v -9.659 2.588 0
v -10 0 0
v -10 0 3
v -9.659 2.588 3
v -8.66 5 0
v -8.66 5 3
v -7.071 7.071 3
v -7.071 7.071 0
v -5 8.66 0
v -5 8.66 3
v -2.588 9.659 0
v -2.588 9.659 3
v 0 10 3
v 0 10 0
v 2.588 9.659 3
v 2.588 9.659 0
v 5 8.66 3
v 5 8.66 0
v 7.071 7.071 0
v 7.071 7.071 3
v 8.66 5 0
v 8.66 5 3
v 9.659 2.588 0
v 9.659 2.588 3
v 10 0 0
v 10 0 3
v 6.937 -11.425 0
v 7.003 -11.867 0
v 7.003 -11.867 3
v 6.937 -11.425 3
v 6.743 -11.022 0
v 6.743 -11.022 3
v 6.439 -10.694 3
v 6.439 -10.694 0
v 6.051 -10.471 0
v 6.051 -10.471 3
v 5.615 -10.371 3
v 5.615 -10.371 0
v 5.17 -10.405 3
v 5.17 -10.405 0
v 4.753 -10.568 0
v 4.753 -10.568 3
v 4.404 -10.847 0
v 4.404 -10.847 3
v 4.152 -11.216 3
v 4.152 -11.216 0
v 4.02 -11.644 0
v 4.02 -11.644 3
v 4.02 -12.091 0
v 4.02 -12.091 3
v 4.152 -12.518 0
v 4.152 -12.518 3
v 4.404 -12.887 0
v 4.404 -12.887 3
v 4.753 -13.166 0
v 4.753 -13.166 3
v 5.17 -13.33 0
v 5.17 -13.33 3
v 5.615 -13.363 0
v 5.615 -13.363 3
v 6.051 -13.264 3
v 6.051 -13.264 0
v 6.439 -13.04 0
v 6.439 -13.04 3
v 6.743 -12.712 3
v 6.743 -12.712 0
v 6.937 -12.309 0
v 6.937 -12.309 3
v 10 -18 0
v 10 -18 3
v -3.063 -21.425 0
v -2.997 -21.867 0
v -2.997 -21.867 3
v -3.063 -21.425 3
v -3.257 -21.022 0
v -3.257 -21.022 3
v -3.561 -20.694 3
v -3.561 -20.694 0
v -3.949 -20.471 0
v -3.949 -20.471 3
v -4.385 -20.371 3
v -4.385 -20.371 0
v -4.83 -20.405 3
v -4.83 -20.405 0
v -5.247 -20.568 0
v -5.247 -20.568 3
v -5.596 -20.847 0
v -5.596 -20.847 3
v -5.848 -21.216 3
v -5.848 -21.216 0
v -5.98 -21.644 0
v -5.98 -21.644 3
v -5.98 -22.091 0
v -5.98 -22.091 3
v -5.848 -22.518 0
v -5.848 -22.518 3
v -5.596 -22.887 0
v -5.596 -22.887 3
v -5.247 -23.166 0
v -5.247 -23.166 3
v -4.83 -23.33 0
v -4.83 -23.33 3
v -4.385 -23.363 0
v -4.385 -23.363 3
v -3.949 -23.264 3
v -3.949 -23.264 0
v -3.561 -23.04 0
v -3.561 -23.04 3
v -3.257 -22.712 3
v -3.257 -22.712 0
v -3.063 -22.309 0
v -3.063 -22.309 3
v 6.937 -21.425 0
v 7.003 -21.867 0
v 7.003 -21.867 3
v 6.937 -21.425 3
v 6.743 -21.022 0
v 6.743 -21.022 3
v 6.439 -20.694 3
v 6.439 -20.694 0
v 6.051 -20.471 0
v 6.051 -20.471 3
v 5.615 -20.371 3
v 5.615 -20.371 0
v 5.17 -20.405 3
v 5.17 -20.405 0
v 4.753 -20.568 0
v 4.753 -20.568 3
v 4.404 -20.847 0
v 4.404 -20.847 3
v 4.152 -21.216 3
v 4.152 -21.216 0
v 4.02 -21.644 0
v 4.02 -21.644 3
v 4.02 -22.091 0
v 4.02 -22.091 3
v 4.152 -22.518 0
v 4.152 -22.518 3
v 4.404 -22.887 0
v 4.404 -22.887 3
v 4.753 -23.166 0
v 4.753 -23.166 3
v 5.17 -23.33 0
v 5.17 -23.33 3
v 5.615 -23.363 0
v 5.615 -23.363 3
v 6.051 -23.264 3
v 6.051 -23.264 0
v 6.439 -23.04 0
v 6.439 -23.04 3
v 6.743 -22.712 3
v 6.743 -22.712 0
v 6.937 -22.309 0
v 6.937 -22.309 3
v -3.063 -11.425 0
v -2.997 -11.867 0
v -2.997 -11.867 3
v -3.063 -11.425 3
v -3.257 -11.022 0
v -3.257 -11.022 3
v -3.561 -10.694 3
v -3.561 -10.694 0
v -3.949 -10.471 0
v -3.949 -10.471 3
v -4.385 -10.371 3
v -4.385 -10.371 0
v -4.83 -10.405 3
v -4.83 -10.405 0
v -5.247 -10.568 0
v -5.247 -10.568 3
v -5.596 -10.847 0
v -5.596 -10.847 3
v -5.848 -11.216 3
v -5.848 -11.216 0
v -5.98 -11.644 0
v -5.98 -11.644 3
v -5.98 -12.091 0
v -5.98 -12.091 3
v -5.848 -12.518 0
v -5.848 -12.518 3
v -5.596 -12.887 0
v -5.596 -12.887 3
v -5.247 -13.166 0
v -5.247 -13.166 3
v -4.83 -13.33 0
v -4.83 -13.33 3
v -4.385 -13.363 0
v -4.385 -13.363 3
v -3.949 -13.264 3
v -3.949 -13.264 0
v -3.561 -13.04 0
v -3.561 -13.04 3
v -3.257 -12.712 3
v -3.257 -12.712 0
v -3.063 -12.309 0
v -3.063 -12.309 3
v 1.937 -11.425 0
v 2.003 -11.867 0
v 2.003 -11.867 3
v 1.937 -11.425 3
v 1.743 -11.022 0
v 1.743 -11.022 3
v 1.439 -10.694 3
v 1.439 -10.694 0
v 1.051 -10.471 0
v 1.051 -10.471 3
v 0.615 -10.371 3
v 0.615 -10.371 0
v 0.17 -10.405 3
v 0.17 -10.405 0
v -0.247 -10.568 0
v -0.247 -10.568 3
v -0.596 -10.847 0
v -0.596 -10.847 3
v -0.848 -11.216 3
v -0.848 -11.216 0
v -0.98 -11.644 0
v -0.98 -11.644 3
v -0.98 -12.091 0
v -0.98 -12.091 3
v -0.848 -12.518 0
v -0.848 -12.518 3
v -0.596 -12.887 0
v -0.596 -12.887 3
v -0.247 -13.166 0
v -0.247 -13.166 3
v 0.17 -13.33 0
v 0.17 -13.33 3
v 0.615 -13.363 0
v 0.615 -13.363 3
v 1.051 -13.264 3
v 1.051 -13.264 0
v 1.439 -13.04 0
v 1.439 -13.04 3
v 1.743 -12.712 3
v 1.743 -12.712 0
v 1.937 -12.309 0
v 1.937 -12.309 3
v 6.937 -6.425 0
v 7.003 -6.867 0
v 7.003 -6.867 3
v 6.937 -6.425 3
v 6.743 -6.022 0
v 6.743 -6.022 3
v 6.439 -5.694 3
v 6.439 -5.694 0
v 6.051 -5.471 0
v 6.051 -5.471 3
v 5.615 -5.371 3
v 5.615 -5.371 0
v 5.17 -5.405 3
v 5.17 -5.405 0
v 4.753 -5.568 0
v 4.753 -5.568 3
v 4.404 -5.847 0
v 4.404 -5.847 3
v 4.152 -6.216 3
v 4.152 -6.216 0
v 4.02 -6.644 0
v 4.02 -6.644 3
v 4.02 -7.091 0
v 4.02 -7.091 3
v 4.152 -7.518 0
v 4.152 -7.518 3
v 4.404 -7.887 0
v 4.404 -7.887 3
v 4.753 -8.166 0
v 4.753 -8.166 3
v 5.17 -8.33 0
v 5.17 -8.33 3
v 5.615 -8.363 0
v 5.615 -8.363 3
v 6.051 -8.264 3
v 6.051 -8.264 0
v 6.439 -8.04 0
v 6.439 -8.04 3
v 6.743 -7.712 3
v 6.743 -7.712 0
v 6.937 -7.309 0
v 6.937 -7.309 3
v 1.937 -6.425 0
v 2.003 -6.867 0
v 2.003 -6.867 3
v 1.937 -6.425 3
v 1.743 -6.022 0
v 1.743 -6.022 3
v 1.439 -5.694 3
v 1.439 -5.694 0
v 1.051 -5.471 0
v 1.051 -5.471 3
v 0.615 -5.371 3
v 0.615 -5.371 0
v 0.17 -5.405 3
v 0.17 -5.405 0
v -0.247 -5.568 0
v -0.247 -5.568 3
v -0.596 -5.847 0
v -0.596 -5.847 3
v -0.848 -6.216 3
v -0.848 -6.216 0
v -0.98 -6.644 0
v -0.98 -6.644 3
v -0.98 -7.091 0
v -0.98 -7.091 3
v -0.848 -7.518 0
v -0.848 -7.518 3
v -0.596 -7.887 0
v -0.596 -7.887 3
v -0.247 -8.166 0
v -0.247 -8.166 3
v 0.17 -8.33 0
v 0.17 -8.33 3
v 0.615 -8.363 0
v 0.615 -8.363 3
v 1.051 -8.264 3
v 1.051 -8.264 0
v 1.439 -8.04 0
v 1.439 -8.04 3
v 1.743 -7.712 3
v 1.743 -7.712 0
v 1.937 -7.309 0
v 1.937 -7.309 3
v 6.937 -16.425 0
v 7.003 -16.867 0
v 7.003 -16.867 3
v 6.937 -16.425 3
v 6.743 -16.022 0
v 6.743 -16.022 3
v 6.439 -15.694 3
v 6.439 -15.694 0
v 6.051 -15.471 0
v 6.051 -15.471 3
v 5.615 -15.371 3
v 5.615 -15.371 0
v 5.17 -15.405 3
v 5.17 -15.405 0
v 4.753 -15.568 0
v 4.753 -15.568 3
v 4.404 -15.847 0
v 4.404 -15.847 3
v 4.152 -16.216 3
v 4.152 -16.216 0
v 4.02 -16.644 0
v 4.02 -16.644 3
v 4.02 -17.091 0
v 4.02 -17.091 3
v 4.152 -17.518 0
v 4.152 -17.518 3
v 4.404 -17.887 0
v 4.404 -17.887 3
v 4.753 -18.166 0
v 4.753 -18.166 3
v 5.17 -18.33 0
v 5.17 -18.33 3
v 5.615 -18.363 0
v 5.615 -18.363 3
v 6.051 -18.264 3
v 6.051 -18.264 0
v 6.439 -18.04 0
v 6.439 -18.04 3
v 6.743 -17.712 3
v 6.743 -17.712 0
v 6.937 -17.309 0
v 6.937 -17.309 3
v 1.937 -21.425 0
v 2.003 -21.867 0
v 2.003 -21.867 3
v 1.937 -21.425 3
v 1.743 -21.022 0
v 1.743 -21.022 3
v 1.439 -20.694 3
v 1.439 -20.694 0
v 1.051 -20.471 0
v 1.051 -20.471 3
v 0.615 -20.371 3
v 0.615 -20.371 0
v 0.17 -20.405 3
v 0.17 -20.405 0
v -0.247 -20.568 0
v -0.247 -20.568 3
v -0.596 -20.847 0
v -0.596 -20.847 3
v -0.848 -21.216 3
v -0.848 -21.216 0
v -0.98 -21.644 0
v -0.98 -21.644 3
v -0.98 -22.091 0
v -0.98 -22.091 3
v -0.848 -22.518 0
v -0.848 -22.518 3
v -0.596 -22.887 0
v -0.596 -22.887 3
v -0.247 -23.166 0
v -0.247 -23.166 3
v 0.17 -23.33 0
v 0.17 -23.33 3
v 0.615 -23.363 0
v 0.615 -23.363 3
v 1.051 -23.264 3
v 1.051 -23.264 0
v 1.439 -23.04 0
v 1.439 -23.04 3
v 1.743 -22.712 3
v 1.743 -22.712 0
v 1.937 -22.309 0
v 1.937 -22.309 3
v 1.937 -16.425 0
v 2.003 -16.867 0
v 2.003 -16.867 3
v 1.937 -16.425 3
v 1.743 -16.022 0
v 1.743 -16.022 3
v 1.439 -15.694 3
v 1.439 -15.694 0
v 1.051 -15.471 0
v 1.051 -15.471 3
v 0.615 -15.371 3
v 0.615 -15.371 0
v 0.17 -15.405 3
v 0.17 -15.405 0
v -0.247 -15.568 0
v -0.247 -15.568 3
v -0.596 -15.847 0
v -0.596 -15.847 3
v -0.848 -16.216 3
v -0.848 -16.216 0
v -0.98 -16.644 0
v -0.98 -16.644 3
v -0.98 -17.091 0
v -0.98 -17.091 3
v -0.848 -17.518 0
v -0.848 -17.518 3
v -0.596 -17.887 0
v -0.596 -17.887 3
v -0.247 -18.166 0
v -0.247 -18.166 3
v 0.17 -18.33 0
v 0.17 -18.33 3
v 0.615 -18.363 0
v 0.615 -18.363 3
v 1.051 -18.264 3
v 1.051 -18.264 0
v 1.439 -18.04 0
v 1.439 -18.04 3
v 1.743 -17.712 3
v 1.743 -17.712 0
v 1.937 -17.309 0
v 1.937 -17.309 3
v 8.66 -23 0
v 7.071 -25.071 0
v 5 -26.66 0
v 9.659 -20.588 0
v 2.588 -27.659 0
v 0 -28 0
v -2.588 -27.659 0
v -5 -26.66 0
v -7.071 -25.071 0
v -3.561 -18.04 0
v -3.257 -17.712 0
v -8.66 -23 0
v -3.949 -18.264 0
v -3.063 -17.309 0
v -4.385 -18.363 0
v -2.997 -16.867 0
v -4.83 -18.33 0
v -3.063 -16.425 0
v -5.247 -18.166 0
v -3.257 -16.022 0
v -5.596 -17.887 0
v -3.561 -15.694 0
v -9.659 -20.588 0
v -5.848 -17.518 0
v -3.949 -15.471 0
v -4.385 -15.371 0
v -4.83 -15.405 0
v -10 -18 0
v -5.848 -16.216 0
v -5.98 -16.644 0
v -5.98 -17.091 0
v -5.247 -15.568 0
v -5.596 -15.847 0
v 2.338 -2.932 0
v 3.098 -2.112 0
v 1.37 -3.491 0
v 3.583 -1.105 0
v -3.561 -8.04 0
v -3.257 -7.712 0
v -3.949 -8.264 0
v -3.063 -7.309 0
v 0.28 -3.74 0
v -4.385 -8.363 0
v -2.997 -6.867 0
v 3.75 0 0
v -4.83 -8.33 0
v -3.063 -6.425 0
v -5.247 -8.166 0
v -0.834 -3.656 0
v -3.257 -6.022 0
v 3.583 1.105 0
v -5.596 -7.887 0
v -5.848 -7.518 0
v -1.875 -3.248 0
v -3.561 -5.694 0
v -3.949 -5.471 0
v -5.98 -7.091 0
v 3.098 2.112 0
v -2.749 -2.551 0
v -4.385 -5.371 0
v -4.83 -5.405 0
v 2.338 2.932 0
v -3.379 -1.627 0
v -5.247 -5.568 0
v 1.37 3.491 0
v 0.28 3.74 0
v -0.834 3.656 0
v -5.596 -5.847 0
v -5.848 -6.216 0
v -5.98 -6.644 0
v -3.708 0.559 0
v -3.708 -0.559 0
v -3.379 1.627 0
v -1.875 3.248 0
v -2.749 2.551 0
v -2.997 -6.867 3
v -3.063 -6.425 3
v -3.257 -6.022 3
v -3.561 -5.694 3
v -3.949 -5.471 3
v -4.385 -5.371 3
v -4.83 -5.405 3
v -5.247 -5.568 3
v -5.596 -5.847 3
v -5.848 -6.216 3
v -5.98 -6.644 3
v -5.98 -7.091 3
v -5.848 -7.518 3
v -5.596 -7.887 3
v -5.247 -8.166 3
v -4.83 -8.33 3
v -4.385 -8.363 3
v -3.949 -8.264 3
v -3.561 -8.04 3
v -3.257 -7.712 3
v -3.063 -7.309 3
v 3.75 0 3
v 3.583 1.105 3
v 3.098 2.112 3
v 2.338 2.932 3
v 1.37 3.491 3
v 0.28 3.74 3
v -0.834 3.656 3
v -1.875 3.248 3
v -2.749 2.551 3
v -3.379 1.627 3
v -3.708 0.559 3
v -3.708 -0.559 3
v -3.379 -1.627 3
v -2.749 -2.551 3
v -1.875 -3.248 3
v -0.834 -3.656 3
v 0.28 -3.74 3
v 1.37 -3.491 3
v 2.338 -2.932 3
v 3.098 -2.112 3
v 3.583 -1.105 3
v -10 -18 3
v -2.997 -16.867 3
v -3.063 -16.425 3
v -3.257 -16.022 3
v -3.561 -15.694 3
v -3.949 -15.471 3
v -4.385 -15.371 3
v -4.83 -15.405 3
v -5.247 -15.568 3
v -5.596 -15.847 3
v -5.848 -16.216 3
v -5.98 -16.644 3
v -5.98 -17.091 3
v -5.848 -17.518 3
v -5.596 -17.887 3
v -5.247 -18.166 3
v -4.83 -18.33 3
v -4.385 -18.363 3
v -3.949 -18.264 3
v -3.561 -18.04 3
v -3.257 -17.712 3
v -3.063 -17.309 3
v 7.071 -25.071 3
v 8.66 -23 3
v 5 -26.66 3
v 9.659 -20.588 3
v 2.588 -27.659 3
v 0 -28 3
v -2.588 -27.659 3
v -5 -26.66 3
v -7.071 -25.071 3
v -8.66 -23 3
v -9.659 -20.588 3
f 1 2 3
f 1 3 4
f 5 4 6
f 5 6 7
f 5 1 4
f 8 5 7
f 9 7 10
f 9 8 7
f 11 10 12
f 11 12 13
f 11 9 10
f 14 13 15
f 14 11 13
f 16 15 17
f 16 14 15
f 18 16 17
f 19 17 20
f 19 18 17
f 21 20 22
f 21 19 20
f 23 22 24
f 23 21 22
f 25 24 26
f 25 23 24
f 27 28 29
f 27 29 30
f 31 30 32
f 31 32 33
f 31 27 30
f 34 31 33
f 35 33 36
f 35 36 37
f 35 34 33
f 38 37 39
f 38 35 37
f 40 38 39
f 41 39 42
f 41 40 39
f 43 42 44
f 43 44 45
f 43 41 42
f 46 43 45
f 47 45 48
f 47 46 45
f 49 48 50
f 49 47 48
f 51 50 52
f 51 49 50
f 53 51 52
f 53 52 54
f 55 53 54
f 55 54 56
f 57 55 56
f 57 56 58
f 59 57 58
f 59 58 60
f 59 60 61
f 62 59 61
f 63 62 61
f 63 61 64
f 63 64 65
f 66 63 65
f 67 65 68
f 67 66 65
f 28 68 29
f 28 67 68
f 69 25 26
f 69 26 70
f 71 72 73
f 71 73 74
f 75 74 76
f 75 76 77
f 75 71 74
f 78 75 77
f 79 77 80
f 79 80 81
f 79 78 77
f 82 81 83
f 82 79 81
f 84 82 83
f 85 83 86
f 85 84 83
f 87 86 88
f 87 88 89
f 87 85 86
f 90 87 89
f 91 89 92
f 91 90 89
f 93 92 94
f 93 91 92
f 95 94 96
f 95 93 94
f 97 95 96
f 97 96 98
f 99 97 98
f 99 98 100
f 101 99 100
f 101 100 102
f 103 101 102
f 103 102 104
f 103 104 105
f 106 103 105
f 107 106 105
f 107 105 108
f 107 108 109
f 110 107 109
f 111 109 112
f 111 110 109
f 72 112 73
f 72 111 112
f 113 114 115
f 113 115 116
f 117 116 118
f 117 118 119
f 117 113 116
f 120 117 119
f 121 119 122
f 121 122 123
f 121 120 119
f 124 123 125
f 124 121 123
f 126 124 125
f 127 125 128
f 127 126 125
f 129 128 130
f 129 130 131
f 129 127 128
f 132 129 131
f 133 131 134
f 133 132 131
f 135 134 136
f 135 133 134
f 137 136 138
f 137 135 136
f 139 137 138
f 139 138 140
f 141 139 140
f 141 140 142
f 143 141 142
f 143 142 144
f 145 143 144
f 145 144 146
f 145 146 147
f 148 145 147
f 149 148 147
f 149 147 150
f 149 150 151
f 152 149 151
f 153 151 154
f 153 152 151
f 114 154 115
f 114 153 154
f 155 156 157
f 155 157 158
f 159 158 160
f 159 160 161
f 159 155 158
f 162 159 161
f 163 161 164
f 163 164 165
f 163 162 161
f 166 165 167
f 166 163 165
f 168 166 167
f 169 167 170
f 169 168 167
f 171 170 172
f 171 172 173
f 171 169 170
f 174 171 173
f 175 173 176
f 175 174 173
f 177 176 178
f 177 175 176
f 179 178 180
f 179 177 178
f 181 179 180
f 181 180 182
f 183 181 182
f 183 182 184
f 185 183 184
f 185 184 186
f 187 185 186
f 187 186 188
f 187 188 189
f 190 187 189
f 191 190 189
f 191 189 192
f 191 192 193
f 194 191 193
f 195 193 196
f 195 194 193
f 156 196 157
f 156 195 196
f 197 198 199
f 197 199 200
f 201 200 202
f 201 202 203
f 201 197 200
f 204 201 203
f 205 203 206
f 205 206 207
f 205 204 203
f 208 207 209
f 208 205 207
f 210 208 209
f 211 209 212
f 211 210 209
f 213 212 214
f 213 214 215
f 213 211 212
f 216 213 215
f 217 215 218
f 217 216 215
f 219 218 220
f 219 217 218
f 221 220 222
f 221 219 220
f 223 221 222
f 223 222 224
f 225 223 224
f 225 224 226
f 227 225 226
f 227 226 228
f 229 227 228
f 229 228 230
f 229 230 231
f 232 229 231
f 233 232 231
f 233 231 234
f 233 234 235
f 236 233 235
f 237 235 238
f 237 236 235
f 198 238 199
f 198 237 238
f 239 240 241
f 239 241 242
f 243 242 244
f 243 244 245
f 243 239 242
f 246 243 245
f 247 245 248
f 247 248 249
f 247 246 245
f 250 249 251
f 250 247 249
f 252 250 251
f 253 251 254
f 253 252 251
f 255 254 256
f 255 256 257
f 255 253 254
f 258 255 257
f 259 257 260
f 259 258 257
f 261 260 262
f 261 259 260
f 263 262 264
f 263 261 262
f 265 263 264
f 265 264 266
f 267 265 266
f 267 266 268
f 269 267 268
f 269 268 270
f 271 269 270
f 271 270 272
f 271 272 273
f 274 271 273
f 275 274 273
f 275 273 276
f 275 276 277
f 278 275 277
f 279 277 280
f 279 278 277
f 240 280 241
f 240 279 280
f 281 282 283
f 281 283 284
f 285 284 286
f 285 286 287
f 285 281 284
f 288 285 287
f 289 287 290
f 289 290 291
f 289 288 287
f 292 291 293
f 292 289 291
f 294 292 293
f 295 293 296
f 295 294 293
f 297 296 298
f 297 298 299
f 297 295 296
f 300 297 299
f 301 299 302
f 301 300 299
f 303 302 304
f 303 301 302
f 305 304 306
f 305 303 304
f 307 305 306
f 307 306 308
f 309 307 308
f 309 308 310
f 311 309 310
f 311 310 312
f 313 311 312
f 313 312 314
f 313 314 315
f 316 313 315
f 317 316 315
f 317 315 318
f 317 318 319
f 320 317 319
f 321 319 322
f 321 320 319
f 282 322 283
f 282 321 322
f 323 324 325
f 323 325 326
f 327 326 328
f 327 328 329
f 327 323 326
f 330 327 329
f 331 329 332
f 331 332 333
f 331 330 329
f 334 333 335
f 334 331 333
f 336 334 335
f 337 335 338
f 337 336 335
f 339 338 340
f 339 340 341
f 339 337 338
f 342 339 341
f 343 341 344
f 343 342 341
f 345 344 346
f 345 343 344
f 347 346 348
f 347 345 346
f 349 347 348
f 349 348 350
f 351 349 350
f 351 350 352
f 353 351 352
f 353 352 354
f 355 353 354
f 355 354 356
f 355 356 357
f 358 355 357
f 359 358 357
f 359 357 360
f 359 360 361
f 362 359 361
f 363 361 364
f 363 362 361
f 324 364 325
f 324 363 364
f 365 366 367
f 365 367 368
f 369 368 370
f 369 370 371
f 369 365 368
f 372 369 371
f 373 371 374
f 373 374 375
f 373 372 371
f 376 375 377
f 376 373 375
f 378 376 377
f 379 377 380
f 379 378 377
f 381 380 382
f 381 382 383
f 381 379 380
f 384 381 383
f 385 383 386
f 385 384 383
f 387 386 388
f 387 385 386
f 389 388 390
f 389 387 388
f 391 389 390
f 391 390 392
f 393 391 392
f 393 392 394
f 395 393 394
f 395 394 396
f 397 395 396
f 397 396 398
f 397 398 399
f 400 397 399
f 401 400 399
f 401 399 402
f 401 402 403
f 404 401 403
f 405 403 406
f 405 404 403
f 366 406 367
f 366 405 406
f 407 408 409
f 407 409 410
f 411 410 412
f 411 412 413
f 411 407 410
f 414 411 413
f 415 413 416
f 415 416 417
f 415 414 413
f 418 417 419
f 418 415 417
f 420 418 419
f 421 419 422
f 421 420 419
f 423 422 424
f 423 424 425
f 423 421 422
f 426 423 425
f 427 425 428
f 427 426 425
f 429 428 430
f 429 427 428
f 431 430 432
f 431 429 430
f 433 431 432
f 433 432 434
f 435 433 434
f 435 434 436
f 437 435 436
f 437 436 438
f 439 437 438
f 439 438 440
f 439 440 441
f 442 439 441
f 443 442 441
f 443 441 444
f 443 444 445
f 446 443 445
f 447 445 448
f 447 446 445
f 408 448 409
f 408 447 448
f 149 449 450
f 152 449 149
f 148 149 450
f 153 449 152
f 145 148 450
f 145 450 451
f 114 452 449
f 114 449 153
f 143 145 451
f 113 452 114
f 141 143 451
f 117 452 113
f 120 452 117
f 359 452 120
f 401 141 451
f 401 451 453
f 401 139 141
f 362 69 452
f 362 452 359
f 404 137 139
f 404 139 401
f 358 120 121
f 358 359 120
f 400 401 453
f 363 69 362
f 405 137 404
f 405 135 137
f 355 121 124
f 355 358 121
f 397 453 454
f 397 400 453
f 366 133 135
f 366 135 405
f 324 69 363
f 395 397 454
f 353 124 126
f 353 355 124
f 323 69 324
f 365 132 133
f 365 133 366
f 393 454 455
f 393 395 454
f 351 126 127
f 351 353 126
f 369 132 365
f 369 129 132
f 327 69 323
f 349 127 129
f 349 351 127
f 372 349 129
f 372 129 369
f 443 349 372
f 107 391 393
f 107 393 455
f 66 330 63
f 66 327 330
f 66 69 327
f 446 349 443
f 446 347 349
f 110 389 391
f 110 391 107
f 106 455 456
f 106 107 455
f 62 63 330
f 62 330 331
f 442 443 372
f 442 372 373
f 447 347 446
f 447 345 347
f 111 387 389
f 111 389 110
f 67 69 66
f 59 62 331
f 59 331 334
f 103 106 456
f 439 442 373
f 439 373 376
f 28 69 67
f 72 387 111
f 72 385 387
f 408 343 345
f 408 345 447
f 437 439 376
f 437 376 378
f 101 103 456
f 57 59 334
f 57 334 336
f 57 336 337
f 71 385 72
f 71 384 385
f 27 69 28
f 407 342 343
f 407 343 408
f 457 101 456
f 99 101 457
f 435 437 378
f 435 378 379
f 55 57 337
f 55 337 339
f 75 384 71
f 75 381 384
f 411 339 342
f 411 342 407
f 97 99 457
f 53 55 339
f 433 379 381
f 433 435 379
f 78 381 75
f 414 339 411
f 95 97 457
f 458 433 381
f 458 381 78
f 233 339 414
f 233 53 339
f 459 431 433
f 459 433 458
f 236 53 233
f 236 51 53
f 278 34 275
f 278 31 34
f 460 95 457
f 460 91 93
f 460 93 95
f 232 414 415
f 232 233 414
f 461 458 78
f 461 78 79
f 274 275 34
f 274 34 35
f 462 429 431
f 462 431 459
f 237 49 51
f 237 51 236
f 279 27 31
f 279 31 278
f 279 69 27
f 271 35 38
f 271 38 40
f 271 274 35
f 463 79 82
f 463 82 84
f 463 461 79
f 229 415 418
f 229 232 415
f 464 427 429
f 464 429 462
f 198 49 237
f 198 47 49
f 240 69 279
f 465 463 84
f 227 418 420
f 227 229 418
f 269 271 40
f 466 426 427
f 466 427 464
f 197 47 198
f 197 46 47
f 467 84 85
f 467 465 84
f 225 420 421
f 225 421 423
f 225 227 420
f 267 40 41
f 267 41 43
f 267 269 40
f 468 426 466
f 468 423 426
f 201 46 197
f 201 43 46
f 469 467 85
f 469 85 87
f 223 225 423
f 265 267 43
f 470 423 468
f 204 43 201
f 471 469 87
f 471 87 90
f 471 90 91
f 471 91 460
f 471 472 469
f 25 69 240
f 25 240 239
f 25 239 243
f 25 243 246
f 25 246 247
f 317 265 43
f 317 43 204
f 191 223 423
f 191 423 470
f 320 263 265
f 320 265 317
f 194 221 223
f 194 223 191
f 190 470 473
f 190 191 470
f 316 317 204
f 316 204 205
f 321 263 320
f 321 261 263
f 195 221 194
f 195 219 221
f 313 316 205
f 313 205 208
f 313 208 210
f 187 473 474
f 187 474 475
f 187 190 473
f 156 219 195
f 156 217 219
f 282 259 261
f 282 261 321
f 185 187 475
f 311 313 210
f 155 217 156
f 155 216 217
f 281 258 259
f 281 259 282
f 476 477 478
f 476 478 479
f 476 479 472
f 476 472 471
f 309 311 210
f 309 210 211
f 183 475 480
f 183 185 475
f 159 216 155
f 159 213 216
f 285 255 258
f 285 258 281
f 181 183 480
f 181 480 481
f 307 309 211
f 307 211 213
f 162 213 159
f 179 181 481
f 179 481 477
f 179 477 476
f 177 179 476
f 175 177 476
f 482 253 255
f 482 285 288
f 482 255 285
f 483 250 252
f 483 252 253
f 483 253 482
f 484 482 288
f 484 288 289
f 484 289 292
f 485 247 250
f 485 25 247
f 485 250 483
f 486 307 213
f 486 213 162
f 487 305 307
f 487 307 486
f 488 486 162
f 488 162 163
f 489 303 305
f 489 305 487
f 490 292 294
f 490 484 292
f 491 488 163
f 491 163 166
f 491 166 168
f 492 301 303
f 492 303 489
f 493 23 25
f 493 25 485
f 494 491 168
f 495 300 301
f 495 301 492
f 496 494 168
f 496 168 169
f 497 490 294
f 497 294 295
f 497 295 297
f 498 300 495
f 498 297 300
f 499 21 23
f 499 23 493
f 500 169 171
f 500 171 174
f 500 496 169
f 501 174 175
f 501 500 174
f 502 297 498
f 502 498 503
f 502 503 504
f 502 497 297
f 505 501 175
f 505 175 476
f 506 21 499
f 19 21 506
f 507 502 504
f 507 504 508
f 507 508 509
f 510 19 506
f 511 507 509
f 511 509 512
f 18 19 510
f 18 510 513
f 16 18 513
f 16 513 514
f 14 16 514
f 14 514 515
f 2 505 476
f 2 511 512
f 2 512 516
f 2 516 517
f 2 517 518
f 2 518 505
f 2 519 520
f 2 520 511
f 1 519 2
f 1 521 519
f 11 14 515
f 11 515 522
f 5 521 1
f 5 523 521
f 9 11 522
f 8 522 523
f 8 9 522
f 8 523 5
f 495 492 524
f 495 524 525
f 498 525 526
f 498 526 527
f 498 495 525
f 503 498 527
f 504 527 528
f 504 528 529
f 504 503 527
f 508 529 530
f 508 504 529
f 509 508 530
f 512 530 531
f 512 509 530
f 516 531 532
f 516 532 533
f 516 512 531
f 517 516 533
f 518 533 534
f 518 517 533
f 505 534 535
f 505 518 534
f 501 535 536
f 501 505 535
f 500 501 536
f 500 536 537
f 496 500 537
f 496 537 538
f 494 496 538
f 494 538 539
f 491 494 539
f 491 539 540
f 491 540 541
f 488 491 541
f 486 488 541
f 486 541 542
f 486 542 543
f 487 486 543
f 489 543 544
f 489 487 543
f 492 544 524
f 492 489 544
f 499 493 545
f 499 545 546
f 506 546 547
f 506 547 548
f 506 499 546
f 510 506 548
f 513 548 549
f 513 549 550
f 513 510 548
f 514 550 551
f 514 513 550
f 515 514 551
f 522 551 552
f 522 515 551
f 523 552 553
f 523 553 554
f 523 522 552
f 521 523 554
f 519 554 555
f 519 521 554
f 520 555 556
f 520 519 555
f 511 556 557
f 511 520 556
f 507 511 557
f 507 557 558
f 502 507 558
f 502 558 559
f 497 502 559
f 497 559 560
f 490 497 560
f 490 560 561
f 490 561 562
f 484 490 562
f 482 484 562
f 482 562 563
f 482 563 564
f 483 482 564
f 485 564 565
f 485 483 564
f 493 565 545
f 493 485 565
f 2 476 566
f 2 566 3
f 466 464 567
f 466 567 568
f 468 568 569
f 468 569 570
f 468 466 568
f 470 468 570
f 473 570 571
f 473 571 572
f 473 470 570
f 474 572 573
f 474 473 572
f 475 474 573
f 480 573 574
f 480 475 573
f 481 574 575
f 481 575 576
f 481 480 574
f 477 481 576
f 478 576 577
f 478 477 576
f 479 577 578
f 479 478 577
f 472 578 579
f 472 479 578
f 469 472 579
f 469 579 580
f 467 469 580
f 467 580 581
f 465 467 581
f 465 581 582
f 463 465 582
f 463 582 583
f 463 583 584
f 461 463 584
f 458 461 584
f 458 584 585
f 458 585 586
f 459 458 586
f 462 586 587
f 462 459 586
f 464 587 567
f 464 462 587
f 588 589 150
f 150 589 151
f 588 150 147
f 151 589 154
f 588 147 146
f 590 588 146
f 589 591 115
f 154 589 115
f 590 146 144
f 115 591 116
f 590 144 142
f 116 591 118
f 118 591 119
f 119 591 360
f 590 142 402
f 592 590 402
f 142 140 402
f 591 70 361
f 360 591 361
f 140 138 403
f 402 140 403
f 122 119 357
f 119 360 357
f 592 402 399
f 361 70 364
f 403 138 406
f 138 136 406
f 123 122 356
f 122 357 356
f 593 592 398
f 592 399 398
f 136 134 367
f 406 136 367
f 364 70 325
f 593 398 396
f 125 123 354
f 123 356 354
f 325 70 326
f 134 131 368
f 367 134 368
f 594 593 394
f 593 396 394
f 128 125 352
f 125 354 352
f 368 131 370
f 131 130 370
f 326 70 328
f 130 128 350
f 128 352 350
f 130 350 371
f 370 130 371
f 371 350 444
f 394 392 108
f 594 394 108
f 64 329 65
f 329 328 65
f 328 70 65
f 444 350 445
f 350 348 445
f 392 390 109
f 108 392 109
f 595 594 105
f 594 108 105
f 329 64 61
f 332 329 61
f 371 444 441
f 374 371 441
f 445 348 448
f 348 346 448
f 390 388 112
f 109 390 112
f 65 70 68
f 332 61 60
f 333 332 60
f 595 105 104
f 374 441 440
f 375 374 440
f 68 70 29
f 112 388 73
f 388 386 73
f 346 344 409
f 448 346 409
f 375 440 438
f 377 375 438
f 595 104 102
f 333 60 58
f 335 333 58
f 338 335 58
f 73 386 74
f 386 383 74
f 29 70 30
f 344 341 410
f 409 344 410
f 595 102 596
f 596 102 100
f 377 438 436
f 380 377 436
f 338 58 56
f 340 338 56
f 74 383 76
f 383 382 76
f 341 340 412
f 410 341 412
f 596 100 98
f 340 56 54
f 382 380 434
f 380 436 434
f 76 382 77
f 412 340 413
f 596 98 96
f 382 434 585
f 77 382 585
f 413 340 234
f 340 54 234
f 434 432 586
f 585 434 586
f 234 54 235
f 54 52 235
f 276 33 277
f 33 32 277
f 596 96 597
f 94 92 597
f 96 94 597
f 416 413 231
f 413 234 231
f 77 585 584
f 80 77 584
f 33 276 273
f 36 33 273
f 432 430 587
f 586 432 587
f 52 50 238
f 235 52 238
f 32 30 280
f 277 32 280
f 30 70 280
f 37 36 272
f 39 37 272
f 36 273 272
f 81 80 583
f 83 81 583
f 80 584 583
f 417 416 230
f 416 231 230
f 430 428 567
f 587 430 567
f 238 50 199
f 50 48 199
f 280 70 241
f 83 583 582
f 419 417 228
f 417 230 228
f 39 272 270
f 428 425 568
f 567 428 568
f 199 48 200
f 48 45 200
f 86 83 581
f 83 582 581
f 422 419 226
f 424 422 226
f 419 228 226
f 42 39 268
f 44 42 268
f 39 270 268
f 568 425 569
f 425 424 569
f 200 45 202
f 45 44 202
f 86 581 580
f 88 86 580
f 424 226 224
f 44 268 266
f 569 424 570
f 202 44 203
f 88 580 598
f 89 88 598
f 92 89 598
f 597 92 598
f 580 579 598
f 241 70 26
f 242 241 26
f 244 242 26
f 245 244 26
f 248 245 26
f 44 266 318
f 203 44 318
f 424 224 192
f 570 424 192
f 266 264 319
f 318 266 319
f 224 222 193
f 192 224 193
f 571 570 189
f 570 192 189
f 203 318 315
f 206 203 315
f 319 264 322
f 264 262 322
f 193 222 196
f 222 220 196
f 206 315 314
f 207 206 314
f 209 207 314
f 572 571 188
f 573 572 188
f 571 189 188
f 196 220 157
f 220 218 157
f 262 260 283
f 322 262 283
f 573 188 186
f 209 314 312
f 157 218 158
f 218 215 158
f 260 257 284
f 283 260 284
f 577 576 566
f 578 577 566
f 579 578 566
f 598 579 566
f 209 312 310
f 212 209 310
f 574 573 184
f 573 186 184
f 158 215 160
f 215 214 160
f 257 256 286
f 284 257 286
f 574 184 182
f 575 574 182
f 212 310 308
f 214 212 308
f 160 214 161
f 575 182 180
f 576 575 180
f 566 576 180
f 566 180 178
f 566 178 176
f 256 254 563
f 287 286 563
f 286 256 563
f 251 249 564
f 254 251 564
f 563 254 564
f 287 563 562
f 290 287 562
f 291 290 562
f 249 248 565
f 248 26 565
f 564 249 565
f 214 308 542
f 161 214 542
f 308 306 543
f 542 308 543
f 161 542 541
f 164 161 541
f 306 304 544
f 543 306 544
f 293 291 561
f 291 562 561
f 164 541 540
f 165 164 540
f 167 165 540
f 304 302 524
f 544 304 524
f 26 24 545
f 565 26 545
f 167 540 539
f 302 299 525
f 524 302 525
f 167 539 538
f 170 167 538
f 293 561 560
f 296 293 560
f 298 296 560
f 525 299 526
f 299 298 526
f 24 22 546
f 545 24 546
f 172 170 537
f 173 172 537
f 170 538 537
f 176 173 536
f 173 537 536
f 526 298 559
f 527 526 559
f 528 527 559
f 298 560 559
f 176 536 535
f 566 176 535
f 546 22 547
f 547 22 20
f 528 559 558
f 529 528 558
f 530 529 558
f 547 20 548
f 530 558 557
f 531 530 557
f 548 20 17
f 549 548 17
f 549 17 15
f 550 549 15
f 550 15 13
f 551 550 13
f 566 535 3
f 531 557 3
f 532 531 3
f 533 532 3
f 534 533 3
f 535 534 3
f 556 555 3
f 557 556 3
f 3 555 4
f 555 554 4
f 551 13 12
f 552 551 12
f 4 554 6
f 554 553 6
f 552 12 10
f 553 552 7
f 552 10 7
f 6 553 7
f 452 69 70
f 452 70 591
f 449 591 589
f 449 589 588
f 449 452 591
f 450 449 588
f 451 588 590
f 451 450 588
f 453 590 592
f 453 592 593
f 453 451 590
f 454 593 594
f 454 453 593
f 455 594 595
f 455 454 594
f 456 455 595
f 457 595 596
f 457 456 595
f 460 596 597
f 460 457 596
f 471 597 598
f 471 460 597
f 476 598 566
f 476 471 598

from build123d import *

# Parameters (mm, degrees)
ESQUISSE1_R        = 3.75
ESQUISSE1_R_2      = 1.5
BOSS_EXTRU_1_DEPTH = 3


with BuildPart() as part:
    # Esquisse1 → Boss.-Extru.1 (new body)
    with BuildSketch(Plane.XY):
        with BuildLine():
            Line((-10, -18), (-10, 0))
            ThreePointArc((-10, 0), (0, 10), (10, 0))
            Line((10, 0), (10, -18))
            ThreePointArc((10, -18), (0, -28), (-10, -18))
        make_face()
        Circle(ESQUISSE1_R, mode=Mode.SUBTRACT)
        with Locations((-4.496614477, -21.867219529)):
            Circle(ESQUISSE1_R_2, mode=Mode.SUBTRACT)
        with Locations((0.503385523, -21.867219529)):
            Circle(ESQUISSE1_R_2, mode=Mode.SUBTRACT)
        with Locations((5.503385523, -21.867219529)):
            Circle(ESQUISSE1_R_2, mode=Mode.SUBTRACT)
        with Locations((0.503385523, -16.867219529)):
            Circle(ESQUISSE1_R_2, mode=Mode.SUBTRACT)
        with Locations((5.503385523, -16.867219529)):
            Circle(ESQUISSE1_R_2, mode=Mode.SUBTRACT)
        with Locations((0.503385523, -11.867219529)):
            Circle(ESQUISSE1_R_2, mode=Mode.SUBTRACT)
        with Locations((5.503385523, -11.867219529)):
            Circle(ESQUISSE1_R_2, mode=Mode.SUBTRACT)
        with Locations((0.503385523, -6.867219529)):
            Circle(ESQUISSE1_R_2, mode=Mode.SUBTRACT)
        with Locations((5.503385523, -6.867219529)):
            Circle(ESQUISSE1_R_2, mode=Mode.SUBTRACT)
        with Locations((-4.496614477, -16.867219529)):
            Circle(ESQUISSE1_R_2, mode=Mode.SUBTRACT)
        with Locations((-4.496614477, -11.867219529)):
            Circle(ESQUISSE1_R_2, mode=Mode.SUBTRACT)
        with Locations((-4.496614477, -6.867219529)):
            Circle(ESQUISSE1_R_2, mode=Mode.SUBTRACT)
    extrude(amount=BOSS_EXTRU_1_DEPTH)


solid = part.part
